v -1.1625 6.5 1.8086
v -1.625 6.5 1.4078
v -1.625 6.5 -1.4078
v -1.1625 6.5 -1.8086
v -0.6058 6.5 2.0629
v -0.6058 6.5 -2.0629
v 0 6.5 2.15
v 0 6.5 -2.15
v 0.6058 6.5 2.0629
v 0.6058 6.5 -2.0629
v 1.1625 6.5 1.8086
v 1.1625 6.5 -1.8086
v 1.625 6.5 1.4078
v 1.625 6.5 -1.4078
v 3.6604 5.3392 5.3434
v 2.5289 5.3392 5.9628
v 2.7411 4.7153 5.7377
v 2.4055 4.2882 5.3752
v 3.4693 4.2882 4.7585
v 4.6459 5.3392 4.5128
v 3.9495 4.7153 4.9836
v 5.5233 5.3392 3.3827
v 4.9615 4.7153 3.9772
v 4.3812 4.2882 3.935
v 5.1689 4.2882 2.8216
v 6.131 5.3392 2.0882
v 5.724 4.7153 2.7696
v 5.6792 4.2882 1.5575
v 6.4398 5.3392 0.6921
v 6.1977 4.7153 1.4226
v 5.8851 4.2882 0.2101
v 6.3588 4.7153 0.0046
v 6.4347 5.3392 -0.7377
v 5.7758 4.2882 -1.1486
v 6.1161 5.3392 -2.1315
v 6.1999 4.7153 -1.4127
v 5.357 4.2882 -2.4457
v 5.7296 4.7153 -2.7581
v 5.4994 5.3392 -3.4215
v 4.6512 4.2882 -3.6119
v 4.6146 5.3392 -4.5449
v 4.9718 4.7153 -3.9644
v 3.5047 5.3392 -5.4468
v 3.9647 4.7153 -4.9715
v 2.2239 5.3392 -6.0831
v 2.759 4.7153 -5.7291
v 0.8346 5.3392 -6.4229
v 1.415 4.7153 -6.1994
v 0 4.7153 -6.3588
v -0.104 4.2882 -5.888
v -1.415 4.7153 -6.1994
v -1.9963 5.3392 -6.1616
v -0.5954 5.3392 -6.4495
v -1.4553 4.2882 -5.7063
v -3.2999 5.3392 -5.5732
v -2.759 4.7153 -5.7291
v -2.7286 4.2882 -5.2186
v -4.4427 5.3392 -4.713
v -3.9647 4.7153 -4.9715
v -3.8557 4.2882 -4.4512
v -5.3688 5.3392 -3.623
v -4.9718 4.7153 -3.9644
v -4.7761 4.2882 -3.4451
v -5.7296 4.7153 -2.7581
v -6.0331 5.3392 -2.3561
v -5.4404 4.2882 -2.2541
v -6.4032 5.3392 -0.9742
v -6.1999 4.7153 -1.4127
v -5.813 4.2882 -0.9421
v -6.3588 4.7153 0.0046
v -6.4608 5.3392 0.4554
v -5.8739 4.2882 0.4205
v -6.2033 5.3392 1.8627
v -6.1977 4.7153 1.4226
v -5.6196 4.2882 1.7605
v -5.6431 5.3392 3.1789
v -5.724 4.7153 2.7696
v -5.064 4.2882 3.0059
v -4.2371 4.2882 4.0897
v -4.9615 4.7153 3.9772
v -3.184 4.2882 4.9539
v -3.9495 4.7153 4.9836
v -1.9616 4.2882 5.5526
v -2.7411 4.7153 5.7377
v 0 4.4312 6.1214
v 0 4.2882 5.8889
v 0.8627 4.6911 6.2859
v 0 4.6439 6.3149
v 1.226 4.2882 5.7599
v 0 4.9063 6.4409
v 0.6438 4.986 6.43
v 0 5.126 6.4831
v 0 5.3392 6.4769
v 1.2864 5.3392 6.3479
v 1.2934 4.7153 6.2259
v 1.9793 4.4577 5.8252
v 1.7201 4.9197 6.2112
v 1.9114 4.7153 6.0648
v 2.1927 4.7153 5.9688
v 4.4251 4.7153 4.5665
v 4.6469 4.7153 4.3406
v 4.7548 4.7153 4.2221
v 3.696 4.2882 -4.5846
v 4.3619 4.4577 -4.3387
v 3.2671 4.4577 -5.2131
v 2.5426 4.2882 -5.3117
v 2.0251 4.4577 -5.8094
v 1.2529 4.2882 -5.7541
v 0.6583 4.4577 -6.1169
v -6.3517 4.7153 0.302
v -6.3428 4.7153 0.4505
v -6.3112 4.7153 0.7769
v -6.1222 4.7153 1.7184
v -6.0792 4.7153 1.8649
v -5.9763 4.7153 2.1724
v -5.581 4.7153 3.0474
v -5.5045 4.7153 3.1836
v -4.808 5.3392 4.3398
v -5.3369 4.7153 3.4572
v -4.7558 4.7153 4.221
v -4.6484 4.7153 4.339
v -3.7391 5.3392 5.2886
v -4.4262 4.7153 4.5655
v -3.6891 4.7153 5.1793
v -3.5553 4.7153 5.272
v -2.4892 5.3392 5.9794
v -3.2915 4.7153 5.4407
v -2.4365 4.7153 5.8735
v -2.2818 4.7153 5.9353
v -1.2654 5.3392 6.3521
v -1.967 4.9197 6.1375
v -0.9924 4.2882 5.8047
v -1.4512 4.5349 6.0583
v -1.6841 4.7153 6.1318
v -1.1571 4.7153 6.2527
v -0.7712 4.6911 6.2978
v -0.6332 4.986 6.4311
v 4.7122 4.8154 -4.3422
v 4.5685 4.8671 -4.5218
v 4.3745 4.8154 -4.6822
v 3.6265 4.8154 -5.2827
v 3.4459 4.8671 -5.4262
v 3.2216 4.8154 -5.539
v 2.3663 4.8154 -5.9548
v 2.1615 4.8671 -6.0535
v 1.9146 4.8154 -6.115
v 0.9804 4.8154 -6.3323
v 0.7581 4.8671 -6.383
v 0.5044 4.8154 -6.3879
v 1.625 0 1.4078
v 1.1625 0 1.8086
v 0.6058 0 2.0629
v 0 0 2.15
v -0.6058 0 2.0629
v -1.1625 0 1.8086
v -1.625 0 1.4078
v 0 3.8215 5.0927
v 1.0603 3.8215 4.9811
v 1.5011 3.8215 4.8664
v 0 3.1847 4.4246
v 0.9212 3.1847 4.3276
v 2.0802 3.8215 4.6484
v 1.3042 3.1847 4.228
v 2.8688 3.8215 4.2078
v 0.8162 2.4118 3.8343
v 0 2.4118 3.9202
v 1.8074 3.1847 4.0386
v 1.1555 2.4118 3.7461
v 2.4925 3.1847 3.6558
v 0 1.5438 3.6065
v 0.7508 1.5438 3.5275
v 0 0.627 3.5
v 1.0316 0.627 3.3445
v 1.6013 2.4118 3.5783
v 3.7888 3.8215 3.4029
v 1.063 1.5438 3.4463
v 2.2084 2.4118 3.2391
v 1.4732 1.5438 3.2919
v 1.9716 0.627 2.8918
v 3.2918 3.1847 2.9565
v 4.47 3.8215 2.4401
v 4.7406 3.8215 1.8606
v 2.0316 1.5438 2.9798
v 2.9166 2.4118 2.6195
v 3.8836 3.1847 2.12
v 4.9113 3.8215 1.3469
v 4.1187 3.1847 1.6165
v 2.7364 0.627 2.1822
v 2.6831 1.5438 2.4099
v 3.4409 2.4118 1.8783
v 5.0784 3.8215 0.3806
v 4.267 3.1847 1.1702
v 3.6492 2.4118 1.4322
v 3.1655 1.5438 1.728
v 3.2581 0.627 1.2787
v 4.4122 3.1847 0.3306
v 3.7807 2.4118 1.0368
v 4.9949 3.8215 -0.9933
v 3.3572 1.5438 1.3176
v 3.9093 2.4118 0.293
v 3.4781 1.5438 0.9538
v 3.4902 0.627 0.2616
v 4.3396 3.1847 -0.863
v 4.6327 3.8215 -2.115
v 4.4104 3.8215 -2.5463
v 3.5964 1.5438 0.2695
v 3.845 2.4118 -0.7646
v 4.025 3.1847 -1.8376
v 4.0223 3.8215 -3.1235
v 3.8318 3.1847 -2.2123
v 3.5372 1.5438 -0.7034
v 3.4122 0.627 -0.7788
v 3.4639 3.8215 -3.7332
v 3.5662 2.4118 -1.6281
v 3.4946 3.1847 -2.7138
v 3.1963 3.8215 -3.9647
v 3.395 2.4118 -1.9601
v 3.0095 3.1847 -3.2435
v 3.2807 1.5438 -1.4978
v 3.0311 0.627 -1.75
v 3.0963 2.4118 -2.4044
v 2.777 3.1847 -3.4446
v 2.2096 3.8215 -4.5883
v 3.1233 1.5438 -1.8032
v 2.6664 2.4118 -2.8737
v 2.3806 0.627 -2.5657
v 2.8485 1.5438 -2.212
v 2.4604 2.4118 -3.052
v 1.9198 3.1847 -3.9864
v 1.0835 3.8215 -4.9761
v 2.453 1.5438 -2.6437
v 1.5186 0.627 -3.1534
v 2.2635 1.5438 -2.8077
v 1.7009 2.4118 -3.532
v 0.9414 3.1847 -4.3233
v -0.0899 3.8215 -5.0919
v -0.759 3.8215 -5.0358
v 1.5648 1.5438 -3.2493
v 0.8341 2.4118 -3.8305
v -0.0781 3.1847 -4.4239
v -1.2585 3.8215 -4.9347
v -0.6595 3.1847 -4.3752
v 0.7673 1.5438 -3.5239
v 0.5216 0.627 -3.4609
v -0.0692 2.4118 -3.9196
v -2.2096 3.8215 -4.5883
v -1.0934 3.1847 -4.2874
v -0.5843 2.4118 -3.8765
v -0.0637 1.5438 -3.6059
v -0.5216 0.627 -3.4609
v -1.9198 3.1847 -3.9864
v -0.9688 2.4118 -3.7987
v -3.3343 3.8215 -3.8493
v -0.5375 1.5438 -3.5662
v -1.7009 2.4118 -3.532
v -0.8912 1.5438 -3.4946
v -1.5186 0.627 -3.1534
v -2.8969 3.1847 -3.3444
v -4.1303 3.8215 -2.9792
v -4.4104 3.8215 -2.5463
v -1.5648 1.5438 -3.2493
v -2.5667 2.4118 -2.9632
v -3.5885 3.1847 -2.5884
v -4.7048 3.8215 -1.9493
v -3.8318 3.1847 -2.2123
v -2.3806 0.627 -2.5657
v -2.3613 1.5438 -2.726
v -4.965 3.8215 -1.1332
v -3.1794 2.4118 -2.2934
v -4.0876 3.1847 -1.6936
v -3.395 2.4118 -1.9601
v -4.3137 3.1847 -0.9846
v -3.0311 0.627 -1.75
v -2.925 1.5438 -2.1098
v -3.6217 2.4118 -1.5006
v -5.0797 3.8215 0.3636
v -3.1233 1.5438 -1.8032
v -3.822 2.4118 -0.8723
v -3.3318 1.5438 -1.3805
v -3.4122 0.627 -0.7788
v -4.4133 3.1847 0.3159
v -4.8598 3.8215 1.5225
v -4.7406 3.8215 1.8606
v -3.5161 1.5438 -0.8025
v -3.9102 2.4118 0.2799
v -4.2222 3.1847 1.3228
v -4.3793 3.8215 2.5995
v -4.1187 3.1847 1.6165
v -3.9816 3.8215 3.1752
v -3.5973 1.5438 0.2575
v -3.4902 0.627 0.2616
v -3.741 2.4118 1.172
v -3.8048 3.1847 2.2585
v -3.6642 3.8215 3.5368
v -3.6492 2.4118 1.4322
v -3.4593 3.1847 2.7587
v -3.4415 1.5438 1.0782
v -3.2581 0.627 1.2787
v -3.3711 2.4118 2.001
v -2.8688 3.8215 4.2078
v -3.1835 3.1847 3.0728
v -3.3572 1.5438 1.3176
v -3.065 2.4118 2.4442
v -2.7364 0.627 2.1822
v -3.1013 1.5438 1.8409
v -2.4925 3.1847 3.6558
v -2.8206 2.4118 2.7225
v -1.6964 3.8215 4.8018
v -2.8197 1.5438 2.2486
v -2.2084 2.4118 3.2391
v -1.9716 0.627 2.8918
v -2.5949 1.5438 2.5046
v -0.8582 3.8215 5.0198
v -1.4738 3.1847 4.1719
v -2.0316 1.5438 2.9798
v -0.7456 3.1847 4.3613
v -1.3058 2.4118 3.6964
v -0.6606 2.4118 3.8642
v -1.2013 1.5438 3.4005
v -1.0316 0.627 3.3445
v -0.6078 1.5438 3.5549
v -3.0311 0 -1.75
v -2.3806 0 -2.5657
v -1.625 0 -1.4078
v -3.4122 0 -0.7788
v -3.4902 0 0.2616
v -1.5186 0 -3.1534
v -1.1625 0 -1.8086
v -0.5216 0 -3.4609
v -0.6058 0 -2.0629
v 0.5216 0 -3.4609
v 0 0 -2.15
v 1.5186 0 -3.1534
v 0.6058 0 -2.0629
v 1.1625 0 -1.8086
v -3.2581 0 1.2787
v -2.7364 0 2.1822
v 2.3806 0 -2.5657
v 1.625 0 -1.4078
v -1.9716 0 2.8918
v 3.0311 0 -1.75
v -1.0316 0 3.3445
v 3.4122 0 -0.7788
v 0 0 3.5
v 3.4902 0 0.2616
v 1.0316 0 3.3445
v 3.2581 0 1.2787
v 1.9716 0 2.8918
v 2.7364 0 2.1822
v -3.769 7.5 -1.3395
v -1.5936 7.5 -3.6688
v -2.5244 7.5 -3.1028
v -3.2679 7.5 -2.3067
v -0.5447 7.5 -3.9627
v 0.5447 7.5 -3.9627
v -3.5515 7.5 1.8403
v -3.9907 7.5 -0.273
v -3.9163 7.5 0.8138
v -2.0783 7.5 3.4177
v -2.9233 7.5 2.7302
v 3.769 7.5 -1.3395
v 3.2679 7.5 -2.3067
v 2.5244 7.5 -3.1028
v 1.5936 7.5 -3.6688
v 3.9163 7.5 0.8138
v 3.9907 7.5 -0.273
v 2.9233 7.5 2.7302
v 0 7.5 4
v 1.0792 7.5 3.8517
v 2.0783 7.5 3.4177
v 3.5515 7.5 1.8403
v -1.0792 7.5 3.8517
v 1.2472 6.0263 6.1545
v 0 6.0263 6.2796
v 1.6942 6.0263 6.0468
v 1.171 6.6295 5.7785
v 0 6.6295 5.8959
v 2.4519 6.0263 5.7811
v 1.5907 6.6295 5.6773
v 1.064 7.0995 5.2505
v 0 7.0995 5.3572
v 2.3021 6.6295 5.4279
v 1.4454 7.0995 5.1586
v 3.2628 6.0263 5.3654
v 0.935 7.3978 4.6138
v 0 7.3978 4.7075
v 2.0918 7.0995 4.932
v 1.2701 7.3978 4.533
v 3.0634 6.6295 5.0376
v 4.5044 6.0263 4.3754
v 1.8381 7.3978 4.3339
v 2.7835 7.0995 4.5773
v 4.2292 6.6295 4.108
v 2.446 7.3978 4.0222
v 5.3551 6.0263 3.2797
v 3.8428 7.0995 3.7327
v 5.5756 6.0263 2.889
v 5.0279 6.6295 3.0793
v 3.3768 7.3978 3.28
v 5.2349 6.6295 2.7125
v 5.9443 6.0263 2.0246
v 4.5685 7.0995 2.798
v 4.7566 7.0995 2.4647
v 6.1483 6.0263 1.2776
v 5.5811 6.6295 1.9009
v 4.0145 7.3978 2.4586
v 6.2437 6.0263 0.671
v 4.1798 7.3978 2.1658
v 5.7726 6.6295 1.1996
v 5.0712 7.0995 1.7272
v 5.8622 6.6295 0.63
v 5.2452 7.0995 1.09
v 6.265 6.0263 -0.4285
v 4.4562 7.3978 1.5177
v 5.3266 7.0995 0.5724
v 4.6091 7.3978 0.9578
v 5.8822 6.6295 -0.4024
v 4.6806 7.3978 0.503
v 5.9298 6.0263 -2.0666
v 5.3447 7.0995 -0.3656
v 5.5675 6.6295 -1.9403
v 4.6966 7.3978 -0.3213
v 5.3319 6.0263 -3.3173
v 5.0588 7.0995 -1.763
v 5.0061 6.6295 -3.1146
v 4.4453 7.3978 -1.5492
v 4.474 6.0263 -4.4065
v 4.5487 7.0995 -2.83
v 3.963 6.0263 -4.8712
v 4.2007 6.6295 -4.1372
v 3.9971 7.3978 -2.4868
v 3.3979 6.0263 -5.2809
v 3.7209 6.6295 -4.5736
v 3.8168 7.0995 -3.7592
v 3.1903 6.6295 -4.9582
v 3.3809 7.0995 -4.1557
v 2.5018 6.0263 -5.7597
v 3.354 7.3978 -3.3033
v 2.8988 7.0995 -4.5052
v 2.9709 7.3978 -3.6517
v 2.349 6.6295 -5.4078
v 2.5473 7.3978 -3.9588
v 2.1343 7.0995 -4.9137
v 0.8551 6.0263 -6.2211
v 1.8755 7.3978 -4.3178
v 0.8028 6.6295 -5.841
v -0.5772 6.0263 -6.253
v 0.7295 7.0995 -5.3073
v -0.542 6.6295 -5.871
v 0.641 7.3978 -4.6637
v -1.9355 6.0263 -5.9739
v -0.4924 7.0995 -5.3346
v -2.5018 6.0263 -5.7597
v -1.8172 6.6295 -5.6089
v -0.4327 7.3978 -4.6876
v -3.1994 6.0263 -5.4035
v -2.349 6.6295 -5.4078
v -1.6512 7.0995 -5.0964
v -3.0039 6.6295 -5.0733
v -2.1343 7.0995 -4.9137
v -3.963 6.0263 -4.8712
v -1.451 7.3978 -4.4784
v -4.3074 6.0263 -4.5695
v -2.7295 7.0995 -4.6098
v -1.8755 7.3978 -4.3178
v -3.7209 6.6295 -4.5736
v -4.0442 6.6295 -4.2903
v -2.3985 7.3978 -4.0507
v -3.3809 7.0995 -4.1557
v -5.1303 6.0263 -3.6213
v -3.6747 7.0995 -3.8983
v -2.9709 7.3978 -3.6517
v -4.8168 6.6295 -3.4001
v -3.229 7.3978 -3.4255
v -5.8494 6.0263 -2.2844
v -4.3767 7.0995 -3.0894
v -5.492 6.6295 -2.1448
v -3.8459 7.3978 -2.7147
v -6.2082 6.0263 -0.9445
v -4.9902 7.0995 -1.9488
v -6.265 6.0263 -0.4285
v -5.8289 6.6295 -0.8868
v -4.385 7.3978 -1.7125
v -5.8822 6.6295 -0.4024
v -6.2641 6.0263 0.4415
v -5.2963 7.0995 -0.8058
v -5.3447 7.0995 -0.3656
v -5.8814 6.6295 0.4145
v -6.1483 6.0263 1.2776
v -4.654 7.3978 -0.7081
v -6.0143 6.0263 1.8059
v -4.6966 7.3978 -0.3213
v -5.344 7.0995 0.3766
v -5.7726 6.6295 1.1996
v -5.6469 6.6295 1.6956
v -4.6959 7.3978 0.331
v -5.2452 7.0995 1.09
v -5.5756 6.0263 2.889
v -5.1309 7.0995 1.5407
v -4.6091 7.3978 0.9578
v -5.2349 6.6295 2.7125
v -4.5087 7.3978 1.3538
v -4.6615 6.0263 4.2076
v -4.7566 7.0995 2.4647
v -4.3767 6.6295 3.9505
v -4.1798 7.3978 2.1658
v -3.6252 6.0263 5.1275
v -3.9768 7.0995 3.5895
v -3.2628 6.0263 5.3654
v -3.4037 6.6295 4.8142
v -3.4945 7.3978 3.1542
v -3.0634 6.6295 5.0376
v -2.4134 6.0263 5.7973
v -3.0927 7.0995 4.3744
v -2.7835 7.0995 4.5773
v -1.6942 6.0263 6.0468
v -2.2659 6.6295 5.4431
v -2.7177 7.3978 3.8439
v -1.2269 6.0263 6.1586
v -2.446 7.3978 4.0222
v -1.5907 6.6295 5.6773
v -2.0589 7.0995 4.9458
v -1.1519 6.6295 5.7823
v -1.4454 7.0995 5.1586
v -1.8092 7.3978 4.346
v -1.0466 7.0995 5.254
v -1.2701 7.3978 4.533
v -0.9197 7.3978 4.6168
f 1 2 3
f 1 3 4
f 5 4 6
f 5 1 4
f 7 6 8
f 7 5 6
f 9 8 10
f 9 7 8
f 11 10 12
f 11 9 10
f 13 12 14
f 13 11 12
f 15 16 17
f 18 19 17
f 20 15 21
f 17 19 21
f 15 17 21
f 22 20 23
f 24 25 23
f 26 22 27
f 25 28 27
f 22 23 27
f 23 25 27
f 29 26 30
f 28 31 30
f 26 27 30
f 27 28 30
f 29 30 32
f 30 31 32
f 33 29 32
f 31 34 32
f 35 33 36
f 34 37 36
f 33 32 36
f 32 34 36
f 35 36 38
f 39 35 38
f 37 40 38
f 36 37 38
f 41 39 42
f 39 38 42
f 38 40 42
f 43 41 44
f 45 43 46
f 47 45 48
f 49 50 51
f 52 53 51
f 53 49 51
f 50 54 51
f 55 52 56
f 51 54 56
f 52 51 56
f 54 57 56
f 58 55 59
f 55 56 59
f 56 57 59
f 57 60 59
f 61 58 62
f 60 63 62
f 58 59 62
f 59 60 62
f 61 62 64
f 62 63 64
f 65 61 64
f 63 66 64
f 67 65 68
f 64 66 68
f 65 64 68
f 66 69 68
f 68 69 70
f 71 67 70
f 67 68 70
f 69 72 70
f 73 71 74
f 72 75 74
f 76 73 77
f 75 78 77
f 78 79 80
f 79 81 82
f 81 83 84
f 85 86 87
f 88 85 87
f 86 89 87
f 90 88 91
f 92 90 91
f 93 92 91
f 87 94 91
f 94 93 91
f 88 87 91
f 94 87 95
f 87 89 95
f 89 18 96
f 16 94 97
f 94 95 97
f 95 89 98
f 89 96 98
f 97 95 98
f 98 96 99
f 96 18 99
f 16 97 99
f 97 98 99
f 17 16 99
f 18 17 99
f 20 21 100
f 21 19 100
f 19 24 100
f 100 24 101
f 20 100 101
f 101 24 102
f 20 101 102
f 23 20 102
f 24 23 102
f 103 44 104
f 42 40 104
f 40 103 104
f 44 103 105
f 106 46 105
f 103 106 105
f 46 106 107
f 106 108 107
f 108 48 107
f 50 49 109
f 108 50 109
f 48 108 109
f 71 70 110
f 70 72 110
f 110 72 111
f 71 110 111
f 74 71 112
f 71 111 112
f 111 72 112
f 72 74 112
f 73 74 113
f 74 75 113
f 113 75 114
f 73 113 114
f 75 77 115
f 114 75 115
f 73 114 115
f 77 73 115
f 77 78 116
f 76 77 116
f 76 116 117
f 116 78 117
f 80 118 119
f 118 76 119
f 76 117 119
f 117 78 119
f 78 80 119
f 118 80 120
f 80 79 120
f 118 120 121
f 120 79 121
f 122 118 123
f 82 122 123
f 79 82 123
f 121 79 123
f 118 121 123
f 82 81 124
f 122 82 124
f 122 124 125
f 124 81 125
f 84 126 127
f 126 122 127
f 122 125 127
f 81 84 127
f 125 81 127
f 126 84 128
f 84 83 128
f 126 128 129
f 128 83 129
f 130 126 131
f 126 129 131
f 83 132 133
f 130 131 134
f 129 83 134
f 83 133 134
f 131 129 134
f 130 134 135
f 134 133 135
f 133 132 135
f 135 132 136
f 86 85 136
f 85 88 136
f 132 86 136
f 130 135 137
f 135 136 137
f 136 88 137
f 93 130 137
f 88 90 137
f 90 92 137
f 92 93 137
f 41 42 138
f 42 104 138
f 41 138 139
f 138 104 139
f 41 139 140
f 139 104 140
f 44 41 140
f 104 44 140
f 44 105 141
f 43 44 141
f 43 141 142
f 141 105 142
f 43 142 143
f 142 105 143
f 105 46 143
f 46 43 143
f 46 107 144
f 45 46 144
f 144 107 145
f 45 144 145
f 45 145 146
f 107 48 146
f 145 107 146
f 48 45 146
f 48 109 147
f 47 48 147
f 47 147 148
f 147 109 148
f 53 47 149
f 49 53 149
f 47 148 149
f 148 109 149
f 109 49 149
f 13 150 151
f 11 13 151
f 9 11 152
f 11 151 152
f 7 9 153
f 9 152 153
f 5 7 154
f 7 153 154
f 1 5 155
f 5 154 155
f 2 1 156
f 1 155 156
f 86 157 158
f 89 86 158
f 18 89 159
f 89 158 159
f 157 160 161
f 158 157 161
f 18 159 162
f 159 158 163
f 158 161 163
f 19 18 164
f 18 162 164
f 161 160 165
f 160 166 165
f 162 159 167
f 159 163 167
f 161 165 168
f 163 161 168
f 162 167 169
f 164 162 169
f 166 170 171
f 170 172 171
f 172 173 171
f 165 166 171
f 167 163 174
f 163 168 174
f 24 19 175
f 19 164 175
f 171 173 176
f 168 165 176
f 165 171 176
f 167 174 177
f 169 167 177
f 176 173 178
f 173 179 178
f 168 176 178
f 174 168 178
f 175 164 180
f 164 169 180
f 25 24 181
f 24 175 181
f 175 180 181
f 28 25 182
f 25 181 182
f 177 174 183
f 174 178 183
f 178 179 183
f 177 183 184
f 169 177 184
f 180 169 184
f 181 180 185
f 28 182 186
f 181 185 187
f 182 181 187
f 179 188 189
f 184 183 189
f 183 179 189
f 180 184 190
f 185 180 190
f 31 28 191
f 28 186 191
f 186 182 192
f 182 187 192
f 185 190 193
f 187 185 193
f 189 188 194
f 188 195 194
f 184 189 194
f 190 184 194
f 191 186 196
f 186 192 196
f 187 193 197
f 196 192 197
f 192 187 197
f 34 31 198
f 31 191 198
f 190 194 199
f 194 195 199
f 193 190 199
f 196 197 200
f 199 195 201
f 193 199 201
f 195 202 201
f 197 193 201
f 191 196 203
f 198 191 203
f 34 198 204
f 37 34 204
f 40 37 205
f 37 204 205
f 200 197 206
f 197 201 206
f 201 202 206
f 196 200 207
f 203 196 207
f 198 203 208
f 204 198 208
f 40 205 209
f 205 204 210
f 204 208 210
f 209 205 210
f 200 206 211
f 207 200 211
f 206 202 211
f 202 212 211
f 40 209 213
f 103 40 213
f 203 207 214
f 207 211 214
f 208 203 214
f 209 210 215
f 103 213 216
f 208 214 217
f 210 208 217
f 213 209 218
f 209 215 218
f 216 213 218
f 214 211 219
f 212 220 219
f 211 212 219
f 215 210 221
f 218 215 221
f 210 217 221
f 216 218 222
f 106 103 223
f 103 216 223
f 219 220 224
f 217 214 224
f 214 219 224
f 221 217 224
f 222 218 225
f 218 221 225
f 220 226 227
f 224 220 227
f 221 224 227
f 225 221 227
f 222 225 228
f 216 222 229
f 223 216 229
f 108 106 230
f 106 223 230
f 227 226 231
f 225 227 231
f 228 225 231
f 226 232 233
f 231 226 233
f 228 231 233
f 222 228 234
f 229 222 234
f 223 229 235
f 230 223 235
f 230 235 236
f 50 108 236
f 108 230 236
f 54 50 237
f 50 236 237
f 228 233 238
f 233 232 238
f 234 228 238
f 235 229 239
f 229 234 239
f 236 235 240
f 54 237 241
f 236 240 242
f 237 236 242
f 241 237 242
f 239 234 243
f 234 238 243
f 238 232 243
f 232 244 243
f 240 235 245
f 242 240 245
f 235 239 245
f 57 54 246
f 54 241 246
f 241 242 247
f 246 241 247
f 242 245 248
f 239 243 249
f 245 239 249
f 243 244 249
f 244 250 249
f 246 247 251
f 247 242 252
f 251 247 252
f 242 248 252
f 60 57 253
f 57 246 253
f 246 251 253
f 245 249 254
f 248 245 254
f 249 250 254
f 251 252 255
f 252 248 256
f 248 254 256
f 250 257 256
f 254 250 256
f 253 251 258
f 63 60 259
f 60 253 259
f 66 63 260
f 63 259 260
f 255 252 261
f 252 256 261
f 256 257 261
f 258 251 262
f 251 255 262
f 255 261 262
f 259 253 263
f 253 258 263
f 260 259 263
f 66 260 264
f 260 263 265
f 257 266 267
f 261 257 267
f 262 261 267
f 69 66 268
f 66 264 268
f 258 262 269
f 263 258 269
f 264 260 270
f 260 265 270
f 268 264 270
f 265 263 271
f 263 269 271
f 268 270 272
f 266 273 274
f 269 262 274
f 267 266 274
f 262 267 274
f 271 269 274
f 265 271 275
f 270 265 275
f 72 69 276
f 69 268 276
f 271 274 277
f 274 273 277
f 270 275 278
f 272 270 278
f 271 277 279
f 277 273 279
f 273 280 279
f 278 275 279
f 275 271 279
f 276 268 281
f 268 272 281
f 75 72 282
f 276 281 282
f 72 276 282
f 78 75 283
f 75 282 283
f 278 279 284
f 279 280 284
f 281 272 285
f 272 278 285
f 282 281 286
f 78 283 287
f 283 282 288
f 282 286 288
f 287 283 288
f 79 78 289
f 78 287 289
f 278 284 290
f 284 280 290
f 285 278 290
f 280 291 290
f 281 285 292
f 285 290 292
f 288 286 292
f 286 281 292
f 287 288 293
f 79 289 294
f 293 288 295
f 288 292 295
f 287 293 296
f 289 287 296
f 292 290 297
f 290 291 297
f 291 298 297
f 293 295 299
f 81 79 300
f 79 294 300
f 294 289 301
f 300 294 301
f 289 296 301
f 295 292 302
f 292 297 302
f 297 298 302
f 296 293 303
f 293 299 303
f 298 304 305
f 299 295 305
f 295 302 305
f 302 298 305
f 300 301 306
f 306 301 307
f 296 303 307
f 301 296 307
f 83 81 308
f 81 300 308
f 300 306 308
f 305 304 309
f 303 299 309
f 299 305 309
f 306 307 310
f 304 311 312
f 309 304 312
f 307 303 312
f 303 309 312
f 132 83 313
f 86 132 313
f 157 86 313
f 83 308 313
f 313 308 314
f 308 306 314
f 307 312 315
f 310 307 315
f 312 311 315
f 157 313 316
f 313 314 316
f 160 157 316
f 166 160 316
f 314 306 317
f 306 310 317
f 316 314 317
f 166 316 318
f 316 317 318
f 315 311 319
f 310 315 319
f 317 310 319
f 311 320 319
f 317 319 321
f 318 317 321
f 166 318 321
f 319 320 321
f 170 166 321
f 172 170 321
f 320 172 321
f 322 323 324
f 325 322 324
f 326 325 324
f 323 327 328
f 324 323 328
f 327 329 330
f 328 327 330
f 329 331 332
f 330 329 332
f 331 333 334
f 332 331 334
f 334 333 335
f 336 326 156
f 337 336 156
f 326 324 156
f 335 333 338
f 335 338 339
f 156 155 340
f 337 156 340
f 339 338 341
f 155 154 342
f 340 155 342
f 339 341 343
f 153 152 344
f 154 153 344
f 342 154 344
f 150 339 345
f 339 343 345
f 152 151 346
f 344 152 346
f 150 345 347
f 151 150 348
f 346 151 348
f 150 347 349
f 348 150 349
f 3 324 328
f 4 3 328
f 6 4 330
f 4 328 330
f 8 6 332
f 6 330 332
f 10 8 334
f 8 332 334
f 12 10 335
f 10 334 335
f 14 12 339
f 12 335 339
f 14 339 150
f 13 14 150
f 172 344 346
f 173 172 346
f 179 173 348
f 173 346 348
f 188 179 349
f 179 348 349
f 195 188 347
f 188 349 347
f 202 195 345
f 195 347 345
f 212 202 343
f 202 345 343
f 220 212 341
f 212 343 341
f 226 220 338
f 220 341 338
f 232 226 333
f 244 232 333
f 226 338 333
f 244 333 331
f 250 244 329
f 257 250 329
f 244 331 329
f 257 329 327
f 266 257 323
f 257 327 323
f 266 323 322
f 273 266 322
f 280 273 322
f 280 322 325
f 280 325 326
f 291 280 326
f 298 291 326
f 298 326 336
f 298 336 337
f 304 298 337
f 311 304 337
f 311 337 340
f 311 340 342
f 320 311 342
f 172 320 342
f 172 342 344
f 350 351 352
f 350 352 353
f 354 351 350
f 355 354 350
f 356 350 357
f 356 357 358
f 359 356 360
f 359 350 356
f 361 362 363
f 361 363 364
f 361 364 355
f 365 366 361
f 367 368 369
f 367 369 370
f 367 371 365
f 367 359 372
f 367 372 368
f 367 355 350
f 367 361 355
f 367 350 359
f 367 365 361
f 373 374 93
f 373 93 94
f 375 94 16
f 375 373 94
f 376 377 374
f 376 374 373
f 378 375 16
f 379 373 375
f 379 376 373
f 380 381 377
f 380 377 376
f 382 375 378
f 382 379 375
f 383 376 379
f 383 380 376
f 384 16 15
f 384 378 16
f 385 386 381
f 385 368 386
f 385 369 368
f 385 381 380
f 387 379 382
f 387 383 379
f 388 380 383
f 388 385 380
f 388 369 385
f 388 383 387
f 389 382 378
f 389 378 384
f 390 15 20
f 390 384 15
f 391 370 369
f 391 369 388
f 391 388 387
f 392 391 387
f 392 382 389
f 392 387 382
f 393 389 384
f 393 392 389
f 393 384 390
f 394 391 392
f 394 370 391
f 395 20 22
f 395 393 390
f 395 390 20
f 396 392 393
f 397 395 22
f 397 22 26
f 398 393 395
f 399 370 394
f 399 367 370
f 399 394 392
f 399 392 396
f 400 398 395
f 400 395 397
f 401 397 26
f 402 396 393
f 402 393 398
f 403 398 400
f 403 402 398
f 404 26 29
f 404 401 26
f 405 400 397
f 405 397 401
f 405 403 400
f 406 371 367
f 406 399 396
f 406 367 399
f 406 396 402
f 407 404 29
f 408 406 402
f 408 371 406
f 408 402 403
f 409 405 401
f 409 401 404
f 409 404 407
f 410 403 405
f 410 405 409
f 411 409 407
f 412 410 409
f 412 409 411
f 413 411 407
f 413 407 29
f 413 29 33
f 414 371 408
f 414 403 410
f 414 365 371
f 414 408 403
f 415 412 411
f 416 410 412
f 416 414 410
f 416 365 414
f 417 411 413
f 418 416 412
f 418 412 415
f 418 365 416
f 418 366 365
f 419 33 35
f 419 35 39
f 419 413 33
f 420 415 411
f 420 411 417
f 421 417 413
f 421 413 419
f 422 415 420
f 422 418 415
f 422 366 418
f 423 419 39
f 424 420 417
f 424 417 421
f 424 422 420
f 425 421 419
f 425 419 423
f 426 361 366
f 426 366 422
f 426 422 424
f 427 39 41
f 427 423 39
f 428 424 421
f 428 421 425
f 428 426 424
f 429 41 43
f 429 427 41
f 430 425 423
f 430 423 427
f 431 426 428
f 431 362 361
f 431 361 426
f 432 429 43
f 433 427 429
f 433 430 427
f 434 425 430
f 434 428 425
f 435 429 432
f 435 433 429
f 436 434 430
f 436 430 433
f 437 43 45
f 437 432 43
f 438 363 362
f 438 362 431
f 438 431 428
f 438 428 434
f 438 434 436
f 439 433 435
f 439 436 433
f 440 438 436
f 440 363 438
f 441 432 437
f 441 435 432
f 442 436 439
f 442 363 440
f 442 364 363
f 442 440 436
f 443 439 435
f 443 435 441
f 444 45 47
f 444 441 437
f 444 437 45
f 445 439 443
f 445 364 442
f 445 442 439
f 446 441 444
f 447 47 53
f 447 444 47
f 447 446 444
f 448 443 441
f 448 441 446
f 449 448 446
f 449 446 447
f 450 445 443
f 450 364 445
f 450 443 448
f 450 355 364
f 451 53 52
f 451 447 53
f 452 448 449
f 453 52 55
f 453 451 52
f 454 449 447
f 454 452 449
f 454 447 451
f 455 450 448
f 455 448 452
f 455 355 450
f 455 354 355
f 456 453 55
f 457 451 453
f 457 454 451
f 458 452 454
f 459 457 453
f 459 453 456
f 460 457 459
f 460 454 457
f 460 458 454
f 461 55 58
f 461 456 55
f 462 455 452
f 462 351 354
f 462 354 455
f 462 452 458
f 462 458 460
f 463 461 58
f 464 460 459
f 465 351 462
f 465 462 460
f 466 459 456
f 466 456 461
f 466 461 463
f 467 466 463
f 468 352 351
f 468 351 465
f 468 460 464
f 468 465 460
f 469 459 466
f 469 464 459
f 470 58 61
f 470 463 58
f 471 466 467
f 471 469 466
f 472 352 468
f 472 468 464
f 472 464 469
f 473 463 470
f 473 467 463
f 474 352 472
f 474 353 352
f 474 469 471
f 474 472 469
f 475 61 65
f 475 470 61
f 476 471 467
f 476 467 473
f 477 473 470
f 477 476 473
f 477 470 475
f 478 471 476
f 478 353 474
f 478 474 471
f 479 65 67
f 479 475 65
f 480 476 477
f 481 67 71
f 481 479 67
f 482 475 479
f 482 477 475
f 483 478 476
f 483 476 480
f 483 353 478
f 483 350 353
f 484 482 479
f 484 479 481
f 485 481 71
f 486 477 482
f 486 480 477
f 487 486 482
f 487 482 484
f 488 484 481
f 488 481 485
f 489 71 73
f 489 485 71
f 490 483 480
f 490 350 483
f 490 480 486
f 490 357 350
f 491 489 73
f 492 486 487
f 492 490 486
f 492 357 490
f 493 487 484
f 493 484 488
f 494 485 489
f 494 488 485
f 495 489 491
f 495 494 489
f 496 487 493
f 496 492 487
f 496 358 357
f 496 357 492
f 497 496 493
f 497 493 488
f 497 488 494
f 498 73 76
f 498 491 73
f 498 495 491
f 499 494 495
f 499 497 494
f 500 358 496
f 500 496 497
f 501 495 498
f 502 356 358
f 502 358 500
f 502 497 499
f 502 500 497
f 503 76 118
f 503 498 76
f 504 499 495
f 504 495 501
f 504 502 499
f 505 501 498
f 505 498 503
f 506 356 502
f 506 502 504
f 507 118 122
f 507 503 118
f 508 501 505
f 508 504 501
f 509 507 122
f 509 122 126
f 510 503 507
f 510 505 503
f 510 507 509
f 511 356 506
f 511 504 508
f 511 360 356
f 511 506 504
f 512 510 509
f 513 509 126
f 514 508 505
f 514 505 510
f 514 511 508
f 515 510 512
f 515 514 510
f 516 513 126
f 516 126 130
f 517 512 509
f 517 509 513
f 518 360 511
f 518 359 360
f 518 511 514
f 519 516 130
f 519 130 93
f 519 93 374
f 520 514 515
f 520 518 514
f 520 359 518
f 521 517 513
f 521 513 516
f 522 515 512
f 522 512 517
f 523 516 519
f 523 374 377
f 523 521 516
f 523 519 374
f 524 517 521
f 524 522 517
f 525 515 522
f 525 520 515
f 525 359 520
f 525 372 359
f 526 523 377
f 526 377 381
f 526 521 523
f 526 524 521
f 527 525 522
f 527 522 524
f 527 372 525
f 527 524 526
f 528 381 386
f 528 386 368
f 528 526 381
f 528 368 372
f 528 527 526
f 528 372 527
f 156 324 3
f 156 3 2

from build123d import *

# Parameters (mm, degrees)
SKETCH_1_R          = 3.5
EXTRUDE_1_DEPTH     = 4.5
SKETCH_2_R          = 6.5
EXTRUDE_2_DEPTH     = 3
FILLET_1_R          = 2.5
FILLET_2_R          = 4
SKETCH_3_W          = 3.25
SKETCH_3_H          = 2.815581646
CUT_EXTRUDE_1_DEPTH = 6.5
FILLET_3_R          = 1


with BuildPart() as part:
    # 草图1 → 凸台-拉伸1 (new body)
    with BuildSketch(Plane(origin=(0, 0, 0), x_dir=(1, 0, 0), z_dir=(0, 1, 0))):
        with Locations(Location((0, 0, 0), (0, 0, 270))):
            Circle(SKETCH_1_R)
    extrude(amount=EXTRUDE_1_DEPTH)

    # 草图2 → 凸台-拉伸2 (add)
    with BuildSketch(Plane(origin=(0, 4.5, 0), x_dir=(1, 0, 0), z_dir=(0, 1, 0))):
        with Locations(Location((0, 0, 0), (0, 0, 270))):
            Circle(SKETCH_2_R)
    extrude(amount=EXTRUDE_2_DEPTH)

    # 圆角1
    fillet_1_edges = [part.edges().sort_by_distance(p)[0] for p in [
        (0, 7.5, -6.5),
    ]]
    fillet(fillet_1_edges, radius=FILLET_1_R)

    # 圆角2
    # the kernel refuses this fillet: 4 mm, written as the material it adds along each edge
    with BuildSketch(Plane(origin=(0, 4.5, 0), x_dir=(0, 0, 1), z_dir=(-1, 0, 0))) as fillet_2_piece_1:
        with BuildLine():
            CenterArc((7.5, -3.872983346), FILLET_2_R, 104.477512186, 75.522487814)
            Line((3.5, -3.872983346), (3.42, -3.872983346))
            Line((3.42, -3.872983346), (3.42, 0))
            Line((3.42, 0), (3.5, 0.08))
            ThreePointArc((3.5, 0.08), (5, 0.08), (6.48, 0.077459667))
            Line((6.48, 0.077459667), (6.5, 0))
        make_face()
    revolve(axis=Axis((0, 4.5, 0), (0, 1, 0)))

    # 草图3 → 切除-拉伸1 (cut)
    with BuildSketch(Plane.XZ):
        with BuildLine():
            ThreePointArc((1.625, 1.407790823), (0, 2.15), (-1.625, 1.407790823))
            Line((-1.625, 1.407790823), (1.625, 1.407790823))
        make_face()
        Rectangle(SKETCH_3_W, SKETCH_3_H)
        with BuildLine():
            Line((1.625, -1.407790823), (-1.625, -1.407790823))
            ThreePointArc((-1.625, -1.407790823), (0, -2.15), (1.625, -1.407790823))
        make_face()
    extrude(amount=-CUT_EXTRUDE_1_DEPTH, mode=Mode.SUBTRACT)

    # 圆角3
    fillet_3_edges = [part.edges().sort_by_distance(p)[0] for p in [
        (0, 4.5, -6.5),
    ]]
    fillet(fillet_3_edges, radius=FILLET_3_R)


solid = part.part
